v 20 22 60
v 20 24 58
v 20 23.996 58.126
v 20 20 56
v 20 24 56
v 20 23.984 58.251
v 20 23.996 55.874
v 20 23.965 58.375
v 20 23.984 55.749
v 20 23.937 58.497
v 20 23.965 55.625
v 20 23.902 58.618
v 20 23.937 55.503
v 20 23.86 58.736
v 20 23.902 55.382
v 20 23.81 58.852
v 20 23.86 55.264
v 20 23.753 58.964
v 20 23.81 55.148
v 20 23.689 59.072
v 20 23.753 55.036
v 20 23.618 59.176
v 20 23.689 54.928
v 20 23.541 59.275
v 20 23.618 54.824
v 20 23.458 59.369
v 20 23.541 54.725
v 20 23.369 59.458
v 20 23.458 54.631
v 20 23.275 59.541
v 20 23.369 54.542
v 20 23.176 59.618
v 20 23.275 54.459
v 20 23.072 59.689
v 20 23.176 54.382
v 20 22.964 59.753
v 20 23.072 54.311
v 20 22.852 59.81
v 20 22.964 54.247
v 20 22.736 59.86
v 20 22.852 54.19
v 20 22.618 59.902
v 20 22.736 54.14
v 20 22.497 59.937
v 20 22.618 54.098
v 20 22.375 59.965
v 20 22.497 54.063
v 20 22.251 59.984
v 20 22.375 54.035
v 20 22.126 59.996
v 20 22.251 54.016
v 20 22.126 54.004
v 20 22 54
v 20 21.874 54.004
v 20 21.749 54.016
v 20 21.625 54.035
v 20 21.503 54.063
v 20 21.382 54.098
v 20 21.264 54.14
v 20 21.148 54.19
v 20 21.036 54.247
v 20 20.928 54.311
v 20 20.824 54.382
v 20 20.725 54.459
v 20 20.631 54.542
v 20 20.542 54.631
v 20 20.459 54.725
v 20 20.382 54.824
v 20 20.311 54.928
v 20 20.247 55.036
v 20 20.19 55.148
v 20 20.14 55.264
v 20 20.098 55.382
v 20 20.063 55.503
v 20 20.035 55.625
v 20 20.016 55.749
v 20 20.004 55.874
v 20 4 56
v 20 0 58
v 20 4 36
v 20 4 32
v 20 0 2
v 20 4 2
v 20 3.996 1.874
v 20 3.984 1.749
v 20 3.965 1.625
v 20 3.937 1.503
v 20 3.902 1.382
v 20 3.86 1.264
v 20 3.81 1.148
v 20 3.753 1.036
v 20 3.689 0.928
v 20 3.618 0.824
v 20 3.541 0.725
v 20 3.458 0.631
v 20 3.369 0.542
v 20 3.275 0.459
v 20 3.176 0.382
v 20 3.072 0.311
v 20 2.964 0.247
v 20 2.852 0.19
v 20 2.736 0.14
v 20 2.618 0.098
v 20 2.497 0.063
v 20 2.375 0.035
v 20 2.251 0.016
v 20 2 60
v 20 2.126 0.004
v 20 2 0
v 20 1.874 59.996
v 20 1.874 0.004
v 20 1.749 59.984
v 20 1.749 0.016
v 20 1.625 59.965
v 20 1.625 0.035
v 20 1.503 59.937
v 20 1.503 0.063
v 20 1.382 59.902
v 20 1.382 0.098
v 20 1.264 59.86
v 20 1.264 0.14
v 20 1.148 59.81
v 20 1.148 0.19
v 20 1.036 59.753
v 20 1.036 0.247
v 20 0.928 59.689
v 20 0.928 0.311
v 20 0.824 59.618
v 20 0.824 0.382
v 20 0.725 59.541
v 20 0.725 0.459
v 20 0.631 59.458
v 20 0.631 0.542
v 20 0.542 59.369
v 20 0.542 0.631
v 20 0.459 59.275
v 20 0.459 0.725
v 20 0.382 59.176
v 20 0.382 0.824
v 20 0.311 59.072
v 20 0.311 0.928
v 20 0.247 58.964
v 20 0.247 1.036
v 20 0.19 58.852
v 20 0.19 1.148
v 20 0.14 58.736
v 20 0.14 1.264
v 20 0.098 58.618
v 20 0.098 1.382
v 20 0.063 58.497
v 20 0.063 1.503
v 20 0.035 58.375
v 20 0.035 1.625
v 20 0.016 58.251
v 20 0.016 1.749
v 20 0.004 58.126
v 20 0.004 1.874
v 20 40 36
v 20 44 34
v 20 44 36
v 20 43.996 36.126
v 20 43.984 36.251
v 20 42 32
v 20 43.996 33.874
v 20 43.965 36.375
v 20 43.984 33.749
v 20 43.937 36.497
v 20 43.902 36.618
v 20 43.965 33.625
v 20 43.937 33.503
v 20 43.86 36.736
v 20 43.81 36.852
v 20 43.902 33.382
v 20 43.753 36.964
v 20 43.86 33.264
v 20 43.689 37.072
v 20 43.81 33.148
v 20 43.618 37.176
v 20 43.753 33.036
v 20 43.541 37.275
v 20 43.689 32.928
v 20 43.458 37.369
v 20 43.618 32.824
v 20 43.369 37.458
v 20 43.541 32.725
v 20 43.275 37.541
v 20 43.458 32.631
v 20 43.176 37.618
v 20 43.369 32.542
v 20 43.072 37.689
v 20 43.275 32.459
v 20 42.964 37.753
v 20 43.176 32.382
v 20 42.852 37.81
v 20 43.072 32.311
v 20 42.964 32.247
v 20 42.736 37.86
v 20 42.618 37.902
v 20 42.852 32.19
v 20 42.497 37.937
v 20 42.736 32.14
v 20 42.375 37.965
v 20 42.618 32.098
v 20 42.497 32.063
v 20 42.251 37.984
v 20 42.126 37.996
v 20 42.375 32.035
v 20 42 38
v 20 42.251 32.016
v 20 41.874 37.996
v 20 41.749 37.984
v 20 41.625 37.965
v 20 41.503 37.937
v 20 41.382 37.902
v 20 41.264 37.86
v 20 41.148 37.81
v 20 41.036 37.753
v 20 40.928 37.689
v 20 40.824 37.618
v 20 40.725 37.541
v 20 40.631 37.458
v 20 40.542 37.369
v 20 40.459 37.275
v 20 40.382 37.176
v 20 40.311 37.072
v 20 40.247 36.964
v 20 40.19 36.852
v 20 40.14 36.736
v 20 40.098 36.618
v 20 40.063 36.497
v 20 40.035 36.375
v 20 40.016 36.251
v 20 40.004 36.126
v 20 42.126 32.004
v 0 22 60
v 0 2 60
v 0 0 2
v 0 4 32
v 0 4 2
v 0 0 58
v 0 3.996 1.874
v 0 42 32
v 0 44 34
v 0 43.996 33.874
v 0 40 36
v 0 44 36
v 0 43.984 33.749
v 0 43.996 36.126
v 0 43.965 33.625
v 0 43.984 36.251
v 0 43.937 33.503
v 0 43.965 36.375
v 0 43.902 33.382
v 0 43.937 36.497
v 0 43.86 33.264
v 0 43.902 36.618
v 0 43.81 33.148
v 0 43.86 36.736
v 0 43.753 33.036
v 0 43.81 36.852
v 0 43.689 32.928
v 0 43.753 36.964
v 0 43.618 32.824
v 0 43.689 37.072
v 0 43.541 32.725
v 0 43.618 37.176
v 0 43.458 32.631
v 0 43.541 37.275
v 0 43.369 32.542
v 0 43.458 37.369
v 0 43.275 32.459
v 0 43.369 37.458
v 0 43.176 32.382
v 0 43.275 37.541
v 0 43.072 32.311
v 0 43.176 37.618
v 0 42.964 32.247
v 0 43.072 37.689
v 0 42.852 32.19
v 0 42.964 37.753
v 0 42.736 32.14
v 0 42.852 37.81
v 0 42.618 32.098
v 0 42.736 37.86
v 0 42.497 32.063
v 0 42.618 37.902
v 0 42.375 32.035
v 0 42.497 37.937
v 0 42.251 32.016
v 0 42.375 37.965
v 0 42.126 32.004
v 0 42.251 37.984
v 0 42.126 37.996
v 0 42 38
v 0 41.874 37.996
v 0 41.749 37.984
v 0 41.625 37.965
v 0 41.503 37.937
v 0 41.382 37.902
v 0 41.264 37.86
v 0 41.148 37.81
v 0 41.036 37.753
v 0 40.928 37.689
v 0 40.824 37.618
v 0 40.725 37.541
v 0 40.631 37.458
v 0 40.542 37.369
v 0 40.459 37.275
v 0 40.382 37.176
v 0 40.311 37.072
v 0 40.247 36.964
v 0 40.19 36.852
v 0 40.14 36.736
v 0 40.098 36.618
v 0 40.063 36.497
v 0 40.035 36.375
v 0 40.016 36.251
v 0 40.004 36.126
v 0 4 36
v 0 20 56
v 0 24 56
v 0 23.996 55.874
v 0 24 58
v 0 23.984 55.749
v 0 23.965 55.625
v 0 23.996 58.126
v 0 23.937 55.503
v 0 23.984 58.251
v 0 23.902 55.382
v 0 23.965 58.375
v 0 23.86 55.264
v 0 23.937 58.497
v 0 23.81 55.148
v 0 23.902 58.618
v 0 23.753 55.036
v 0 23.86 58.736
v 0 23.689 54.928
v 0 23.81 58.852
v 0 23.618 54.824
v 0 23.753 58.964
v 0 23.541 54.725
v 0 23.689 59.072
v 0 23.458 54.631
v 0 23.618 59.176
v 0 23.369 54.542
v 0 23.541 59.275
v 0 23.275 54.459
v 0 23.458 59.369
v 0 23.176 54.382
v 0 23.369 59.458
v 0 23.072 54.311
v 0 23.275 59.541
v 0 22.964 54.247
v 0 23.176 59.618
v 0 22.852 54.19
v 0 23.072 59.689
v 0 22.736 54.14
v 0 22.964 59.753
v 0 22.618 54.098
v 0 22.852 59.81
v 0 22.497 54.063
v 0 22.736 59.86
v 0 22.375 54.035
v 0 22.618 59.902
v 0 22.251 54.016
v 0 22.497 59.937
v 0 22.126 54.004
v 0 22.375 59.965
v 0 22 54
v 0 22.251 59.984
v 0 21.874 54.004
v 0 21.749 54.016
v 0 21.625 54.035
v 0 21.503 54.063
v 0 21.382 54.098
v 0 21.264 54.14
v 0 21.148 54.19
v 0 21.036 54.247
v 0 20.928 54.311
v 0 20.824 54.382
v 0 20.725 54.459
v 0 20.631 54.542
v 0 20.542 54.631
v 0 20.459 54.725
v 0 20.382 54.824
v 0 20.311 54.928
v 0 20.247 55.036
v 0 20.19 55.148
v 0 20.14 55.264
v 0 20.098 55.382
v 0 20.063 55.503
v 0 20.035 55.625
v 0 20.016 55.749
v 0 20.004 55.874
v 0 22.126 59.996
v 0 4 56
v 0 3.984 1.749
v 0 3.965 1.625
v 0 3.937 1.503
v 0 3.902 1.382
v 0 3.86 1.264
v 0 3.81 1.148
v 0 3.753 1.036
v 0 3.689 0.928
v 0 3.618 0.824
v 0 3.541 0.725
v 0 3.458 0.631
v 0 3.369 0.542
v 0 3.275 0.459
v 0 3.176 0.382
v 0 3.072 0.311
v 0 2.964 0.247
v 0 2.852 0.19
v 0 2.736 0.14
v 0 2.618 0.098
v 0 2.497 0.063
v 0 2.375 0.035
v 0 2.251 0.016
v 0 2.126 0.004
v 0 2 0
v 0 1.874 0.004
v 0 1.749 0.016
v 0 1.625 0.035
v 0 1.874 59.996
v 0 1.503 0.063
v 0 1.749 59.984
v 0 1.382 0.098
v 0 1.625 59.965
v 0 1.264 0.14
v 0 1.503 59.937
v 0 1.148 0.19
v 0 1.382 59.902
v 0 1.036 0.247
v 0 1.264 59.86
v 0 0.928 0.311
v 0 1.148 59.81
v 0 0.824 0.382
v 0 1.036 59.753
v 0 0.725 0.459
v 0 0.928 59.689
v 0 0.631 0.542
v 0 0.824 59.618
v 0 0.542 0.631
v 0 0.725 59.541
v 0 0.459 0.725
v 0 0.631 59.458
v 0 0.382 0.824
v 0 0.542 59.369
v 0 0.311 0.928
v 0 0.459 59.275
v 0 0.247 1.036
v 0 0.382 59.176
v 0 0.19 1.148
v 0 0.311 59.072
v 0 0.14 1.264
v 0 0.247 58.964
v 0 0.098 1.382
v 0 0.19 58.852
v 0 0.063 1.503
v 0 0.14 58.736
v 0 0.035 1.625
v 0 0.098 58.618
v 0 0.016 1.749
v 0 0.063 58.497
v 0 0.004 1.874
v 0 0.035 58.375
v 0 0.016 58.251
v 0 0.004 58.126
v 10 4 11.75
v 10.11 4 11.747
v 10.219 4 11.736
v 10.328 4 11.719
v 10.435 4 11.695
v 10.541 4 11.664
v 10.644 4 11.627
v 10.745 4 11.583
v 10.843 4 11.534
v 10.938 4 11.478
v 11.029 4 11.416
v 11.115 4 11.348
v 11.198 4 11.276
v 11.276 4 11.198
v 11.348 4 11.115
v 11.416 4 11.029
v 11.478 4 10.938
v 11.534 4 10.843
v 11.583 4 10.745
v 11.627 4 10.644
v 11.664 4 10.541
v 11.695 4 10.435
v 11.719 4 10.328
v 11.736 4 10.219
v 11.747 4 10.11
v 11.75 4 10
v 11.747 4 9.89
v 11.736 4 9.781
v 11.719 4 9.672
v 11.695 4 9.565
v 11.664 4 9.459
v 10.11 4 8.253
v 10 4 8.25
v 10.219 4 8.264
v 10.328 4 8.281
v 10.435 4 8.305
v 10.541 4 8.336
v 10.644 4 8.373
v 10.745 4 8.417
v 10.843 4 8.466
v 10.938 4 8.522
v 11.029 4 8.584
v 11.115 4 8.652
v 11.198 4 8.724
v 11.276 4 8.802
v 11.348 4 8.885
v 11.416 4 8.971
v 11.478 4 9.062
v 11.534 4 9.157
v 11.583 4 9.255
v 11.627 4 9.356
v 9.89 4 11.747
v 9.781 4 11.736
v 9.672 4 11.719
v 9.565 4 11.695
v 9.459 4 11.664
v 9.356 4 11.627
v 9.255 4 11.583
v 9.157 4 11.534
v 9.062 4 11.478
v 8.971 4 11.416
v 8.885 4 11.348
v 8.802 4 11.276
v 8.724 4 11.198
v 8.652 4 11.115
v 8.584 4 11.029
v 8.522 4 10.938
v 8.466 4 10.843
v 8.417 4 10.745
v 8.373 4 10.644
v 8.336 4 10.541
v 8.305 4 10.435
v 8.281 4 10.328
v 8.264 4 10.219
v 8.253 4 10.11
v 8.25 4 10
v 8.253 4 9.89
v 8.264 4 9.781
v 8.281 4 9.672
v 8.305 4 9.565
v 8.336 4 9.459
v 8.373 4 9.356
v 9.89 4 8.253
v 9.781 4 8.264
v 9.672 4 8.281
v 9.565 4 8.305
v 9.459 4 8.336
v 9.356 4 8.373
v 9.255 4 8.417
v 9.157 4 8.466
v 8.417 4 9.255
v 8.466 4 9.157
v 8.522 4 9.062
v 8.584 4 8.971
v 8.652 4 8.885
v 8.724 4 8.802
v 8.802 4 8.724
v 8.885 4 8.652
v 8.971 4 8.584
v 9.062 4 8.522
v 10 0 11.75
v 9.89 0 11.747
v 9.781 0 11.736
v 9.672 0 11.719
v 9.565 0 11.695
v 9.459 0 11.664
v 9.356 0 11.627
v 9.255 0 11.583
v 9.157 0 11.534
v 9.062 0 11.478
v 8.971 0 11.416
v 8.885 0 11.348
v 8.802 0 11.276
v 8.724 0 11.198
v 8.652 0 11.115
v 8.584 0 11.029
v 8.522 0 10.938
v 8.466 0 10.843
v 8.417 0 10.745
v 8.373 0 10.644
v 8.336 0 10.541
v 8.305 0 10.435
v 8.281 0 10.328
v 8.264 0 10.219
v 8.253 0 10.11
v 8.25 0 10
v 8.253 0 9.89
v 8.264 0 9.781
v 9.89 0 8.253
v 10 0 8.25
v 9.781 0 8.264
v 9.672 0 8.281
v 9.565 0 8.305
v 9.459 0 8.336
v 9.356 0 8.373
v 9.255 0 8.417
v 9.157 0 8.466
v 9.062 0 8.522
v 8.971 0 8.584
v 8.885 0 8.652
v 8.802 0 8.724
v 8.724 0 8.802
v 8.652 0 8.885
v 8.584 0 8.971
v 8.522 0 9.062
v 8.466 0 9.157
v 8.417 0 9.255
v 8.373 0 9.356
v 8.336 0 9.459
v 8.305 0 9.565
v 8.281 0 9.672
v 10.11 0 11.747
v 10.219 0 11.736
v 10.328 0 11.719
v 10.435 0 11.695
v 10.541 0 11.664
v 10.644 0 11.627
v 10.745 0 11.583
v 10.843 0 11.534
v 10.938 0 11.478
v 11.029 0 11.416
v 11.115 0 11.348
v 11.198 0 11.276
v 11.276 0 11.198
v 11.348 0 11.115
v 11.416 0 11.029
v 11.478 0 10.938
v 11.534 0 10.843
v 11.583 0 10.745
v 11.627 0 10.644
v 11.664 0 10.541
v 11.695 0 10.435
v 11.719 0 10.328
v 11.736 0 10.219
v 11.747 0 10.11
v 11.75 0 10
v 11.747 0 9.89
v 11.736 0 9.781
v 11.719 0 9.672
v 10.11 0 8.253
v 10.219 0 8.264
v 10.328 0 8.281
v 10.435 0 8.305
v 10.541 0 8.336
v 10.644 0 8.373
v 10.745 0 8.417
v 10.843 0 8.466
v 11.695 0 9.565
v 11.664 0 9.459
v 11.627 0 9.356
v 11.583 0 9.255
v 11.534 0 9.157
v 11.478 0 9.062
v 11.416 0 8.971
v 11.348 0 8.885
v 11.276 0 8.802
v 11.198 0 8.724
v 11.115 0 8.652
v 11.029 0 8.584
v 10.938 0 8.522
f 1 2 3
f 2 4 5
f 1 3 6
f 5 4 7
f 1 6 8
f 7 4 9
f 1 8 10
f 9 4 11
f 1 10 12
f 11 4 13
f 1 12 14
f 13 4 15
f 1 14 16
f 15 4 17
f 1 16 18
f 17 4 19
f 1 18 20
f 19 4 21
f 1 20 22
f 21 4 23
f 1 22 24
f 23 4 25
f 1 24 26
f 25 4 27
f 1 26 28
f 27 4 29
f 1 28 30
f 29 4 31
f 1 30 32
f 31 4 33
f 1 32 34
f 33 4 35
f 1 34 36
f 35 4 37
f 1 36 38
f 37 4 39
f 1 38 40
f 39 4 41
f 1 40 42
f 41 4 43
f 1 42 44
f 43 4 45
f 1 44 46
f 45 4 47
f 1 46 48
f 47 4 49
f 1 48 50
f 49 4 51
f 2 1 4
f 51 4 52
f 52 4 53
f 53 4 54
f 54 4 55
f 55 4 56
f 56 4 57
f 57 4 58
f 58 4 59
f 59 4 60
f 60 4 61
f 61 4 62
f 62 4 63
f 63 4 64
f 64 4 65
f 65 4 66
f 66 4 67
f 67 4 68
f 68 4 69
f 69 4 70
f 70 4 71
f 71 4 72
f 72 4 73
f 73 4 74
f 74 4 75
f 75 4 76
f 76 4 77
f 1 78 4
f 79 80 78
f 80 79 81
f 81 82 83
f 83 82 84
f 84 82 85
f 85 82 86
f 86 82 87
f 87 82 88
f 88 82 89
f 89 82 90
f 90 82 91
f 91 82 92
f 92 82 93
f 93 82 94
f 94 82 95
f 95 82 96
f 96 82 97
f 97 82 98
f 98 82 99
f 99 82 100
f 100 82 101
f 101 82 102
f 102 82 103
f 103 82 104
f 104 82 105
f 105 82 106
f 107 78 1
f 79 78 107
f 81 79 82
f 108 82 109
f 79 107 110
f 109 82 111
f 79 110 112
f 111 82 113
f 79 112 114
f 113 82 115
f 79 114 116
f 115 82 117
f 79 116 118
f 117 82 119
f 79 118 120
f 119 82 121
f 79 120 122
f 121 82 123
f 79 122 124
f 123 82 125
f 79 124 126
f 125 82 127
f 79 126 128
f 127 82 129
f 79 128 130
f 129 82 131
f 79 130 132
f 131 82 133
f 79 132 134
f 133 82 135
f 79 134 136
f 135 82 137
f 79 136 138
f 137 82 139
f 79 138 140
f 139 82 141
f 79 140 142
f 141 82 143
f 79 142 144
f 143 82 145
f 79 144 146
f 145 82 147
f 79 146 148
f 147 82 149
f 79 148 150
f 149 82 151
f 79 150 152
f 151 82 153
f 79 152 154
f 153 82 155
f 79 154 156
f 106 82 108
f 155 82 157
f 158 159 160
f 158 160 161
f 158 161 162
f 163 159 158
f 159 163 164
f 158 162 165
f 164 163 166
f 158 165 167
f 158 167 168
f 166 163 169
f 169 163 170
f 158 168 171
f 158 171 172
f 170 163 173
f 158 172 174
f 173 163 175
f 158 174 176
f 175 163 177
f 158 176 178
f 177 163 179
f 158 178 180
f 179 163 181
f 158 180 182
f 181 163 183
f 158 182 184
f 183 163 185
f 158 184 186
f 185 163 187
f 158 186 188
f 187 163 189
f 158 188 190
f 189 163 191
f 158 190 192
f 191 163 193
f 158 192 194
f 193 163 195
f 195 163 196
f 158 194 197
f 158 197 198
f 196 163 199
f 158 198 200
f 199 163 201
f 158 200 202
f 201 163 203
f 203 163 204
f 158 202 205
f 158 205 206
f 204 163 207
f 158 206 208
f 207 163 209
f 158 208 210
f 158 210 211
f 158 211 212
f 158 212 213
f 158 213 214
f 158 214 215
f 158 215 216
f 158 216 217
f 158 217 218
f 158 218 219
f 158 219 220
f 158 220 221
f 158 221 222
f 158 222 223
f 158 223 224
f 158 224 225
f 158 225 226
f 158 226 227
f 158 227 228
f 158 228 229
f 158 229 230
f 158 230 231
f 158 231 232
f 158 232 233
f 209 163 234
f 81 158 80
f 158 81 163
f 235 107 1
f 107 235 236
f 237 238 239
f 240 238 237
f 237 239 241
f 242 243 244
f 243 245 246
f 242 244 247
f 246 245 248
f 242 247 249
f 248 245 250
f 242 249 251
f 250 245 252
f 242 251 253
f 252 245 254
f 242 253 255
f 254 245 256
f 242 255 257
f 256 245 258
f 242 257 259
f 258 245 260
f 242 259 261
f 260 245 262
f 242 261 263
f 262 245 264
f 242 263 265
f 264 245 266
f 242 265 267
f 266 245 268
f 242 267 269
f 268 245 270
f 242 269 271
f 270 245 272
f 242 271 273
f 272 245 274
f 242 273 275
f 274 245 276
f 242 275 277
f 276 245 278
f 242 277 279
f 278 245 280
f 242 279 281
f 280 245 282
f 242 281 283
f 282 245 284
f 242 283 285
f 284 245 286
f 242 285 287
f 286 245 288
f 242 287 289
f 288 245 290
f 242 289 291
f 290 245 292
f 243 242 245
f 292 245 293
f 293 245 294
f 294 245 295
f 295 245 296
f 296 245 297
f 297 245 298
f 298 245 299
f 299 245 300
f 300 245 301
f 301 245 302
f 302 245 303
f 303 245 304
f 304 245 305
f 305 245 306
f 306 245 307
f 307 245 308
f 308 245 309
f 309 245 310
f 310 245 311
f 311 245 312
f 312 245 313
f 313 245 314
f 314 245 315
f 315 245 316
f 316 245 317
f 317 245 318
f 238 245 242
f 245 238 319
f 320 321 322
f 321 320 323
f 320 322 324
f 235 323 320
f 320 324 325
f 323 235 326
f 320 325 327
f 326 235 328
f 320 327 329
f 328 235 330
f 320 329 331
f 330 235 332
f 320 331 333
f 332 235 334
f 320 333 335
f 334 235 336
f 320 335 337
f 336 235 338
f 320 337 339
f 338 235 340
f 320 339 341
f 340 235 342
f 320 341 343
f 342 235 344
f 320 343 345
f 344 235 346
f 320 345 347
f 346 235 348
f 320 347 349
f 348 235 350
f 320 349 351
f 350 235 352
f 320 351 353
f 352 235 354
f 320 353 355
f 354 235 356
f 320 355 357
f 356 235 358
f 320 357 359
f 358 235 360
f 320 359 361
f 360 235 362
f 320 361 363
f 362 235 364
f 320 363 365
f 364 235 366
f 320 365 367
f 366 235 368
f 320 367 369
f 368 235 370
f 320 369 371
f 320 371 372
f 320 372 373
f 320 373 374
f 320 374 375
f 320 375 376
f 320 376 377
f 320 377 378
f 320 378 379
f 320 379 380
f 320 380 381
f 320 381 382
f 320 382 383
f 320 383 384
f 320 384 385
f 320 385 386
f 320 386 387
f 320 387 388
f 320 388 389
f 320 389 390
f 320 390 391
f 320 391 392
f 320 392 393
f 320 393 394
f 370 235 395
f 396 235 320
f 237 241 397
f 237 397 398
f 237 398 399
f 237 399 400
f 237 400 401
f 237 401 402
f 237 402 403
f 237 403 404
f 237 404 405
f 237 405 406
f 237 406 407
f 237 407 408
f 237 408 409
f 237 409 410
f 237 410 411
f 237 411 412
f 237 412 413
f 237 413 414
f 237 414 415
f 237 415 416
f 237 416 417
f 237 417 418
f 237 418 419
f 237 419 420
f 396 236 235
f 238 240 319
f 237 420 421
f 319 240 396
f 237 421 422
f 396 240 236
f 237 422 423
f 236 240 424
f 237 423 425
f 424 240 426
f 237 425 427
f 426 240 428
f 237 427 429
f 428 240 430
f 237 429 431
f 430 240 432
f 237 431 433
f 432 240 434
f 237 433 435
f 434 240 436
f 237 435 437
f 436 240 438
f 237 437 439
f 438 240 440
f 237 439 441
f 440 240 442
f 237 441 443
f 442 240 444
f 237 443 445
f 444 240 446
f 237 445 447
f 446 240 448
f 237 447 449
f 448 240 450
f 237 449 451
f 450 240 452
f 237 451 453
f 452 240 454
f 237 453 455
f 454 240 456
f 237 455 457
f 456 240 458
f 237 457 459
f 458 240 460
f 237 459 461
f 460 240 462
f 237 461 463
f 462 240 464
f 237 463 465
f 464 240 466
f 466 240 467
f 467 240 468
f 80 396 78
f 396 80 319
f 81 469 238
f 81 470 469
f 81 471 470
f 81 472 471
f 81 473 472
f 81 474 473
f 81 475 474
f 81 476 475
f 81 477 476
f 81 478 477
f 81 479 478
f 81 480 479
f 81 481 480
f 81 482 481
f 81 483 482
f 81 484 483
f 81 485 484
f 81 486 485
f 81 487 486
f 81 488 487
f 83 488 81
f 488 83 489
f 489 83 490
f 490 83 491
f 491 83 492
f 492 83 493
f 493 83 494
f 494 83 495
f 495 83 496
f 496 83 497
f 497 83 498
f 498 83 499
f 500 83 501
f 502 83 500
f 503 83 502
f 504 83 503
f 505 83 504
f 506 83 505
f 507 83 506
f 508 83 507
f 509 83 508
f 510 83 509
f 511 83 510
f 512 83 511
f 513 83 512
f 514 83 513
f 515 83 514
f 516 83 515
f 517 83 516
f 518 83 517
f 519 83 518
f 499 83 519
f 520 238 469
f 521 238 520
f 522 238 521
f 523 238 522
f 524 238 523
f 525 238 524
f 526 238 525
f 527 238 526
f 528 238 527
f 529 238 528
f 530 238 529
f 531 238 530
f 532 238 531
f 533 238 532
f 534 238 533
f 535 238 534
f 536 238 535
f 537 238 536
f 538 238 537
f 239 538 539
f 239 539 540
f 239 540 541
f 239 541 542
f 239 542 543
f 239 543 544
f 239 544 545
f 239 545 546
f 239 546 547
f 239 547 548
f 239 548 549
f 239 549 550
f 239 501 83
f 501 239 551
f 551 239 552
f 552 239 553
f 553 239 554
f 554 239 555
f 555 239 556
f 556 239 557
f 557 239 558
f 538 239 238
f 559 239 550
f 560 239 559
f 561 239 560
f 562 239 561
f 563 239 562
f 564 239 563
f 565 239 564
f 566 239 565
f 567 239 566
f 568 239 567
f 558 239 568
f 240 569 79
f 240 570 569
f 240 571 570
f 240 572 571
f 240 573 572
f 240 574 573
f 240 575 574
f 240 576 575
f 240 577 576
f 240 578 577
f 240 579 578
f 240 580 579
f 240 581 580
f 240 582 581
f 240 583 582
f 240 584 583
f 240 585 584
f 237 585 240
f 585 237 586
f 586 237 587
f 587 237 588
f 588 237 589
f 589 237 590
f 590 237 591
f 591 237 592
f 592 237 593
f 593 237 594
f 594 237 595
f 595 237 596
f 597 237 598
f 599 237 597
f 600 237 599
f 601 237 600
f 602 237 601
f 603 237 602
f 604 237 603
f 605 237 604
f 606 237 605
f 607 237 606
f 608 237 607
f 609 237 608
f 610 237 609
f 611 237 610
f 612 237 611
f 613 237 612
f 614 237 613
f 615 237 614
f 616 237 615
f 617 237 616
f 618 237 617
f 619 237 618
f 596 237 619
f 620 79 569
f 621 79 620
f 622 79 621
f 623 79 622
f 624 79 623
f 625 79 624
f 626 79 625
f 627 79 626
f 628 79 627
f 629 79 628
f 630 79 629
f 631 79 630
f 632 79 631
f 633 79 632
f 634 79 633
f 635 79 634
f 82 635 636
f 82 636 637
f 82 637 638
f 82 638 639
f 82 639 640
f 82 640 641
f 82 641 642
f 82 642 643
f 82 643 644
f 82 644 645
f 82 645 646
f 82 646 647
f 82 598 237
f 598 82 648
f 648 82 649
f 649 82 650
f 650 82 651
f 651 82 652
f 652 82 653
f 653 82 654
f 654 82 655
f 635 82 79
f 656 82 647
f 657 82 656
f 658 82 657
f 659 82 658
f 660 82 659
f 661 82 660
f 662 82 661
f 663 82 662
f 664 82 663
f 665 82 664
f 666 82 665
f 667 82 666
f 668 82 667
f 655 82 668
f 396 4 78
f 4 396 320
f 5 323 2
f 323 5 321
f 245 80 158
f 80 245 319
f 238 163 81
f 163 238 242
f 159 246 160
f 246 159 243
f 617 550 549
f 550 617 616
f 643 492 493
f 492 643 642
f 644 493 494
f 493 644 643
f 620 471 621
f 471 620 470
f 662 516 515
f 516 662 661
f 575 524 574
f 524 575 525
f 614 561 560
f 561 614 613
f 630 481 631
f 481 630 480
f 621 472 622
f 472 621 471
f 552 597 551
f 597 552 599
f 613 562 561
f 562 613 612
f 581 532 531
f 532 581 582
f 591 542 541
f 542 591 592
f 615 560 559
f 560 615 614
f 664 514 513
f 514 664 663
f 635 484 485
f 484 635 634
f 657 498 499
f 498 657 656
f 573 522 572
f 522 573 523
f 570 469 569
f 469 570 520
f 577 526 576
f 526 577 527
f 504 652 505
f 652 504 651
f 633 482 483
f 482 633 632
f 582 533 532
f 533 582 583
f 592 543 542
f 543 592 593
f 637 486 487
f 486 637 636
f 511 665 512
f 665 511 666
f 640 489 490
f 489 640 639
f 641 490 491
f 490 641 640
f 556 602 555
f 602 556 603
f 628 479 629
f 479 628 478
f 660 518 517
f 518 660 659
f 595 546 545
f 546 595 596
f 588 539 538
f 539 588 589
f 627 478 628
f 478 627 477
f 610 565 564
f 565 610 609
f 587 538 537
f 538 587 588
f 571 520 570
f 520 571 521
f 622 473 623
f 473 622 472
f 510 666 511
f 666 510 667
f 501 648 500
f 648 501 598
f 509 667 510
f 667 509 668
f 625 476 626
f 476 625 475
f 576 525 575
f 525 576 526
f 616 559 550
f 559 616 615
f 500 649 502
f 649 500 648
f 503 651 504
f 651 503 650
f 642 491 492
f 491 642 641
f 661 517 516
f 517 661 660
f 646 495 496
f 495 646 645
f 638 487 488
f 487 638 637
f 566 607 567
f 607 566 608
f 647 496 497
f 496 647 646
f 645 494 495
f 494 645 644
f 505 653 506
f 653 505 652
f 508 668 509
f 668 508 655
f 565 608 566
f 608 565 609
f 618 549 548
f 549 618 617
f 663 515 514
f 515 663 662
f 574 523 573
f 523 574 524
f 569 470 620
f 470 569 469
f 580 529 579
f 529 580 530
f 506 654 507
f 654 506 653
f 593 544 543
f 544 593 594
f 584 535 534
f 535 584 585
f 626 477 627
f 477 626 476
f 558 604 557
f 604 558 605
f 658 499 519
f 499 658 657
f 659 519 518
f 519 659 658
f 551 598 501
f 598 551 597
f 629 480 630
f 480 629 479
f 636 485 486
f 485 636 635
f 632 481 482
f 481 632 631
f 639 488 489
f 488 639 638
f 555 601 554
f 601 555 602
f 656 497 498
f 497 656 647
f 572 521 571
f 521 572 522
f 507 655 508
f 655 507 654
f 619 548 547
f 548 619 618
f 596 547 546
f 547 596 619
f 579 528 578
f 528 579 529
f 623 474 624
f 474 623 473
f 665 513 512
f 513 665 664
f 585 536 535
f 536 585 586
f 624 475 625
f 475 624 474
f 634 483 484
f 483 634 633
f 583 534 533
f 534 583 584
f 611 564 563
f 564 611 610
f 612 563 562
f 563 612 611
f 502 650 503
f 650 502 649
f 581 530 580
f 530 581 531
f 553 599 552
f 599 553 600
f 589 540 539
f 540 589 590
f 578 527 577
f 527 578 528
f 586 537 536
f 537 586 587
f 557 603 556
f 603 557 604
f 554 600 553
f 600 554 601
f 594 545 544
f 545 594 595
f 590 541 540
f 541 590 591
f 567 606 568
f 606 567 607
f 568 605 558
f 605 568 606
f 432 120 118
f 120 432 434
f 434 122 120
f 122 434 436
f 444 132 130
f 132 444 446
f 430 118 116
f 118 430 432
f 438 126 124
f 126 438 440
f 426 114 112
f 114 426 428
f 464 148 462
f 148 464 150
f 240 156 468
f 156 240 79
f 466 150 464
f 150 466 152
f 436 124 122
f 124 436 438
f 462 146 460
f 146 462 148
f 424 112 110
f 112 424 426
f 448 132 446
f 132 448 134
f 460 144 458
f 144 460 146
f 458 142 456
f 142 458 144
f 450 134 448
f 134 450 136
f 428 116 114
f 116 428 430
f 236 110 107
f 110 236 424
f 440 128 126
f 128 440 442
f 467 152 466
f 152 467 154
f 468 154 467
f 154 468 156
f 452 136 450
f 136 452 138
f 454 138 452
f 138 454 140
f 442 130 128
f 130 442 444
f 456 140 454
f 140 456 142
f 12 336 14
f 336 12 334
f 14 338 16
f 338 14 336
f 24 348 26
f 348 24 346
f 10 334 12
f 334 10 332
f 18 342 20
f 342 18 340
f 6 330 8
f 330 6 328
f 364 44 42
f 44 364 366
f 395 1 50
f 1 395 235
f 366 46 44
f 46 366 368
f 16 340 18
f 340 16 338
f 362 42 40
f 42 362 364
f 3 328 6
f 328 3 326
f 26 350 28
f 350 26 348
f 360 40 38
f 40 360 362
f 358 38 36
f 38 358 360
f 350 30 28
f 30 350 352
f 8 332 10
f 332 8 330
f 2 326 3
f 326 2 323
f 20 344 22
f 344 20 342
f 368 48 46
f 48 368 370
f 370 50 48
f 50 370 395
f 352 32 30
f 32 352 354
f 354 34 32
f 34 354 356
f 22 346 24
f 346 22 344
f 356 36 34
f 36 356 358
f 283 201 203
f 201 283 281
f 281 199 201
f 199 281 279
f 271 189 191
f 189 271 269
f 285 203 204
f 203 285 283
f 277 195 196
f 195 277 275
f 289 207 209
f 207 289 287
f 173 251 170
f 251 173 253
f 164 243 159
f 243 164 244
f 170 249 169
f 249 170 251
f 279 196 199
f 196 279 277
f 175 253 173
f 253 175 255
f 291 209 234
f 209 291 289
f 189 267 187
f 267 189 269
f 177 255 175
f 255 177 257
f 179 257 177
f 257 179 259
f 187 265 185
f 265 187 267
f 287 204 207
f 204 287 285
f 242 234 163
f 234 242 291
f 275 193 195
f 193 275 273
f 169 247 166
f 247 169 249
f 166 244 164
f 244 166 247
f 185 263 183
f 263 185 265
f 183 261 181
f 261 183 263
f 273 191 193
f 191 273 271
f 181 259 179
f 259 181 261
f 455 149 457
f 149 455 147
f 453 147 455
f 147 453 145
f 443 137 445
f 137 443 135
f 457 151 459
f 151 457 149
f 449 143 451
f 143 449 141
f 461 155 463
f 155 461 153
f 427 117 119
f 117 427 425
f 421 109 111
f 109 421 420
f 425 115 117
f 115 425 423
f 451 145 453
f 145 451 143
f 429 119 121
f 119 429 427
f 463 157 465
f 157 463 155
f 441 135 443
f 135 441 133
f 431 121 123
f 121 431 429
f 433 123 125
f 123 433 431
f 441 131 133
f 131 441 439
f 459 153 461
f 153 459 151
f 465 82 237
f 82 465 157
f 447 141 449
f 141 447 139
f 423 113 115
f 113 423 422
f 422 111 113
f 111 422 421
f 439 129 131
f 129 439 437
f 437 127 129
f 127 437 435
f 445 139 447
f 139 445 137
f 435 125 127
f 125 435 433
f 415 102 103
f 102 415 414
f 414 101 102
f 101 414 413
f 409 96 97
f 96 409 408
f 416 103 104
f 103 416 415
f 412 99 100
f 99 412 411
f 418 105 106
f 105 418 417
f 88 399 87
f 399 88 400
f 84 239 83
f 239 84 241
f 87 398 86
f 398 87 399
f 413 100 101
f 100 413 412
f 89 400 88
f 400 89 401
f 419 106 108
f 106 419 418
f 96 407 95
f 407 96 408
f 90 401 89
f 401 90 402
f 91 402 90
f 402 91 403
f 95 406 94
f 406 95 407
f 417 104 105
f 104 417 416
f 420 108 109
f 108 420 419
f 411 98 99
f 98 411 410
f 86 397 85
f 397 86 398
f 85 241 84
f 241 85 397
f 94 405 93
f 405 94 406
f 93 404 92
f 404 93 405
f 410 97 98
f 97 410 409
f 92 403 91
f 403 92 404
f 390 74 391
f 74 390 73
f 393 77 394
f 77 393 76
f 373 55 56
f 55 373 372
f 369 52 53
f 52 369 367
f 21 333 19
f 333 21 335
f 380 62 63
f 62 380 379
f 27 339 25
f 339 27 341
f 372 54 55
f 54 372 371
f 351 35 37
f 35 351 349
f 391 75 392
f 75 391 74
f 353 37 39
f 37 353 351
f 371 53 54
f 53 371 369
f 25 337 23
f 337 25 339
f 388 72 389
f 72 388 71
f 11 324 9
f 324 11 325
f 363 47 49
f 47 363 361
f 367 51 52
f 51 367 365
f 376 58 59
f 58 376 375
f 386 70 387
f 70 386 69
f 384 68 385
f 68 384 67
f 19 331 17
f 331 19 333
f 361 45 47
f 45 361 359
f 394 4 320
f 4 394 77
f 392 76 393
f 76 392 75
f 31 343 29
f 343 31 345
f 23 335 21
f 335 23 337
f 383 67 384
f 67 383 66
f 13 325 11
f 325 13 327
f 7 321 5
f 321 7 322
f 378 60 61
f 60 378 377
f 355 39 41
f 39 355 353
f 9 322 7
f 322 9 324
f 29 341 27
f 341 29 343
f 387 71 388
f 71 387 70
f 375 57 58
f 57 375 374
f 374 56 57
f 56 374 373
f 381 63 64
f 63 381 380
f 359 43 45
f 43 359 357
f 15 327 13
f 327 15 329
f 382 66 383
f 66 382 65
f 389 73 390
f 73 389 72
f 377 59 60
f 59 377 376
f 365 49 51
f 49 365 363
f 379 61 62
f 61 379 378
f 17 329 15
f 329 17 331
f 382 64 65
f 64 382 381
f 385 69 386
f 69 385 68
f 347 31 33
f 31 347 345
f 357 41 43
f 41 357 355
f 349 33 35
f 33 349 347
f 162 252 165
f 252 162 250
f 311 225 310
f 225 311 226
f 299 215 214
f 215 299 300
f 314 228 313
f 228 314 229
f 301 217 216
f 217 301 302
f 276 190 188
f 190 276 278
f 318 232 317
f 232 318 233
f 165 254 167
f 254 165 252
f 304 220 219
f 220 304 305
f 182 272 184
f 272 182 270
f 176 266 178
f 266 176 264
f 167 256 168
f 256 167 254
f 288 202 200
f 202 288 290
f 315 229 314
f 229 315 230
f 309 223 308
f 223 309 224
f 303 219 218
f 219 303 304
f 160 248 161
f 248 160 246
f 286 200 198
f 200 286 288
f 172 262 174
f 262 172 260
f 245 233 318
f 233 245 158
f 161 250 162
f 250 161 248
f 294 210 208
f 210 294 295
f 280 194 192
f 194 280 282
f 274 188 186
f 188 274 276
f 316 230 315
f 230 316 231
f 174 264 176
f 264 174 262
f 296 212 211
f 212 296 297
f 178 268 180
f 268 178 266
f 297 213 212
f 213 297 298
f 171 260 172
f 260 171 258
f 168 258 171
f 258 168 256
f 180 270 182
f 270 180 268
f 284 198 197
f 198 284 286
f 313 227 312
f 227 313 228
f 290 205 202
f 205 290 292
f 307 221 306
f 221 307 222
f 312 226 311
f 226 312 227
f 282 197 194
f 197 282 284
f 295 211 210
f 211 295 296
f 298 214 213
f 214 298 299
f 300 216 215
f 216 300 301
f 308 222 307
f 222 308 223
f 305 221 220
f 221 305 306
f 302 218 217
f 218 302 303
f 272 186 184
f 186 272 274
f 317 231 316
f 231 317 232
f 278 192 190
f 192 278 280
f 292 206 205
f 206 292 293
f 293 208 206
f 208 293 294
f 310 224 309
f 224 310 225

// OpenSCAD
// Measures
thick = 4; // Thickness
t_w = 20; // Width
t_h = 60; // Height
u_arm_l = 20; // Upper arm lenght
d_arm_l = 40; // Lower arm lenght
ua_l = u_arm_l+thick;
da_l = d_arm_l+thick;
d_arm_sep = 20; // How far do you want lower tab be from the upper tab
chamfer_size = thick/2;


// Parts definitions
m_part = [t_w,thick,t_h]; // Define the main part
u_arm = [t_w,ua_l,thick]; // Define the upper arm
d_arm = [t_w,da_l,thick]; // Define the lower arm


// Positioning the parts on assembly
m_part_loc = [0,0,0];
ua_loc = t_h-thick;
u_arm_loc = [0,0,ua_loc];
da_loc = (t_h-(thick*2))-d_arm_sep;
d_arm_loc = [0,0,da_loc];


// Parts building
module main_plate()
    {
        translate(m_part_loc) cube(m_part);
        translate(u_arm_loc) cube(u_arm);
        translate(d_arm_loc) cube(d_arm);
    }
    
module main_hole_drilled()
    {
        difference()
            {
                main_plate();
                filament_hole();
            }
    }
    
module main_hole_rounded()
    {
        union()
            {
                main_hole_drilled();
                translate([t_w/2,2.5,t_w/2]) scale(.25
) rotate([90,90,0])round_hole();
            }
    }
    
// Assembly position
*main_hole_drilled();
assembly();

// Drilling hole for the filament
hole_loc = [t_w/2,12,t_w/2];
r_hole_loc_1 = [t_w/2,0,t_w/2];
r_hole_loc_2 = [t_w/2,4,t_w/2];
fil_dia = 1.75; // Diameter of filament
module filament_hole()
    {
        translate(hole_loc) rotate([90,0,0]) cylinder(h = 20, r = fil_dia, $fn = 100);
    }

module round_hole()
    {
rotate_extrude(convexity = .5, $fn = 100)
translate([10,10,10])
circle(r = 3, $fn = 100);
    }

// Rounding corners
module chamfer_template()
    {
        difference()
            {
                translate([-2,-1,0])cube([t_w+4,chamfer_size+1,chamfer_size+1]);
                translate([-4,chamfer_size,0]) rotate([0,90,0]) cylinder(h = t_w+8,r = chamfer_size, $fn = 100);
            }
    }
    
module assembly()
    {
        difference()
            {
                main_hole_drilled();
                // Upper arm chamfers
                translate([0,0,ua_loc+chamfer_size]) chamfer_template();
                translate([0,u_arm_l+chamfer_size,ua_loc+(chamfer_size*2)]) rotate([-90,0,0]) chamfer_template();
                *translate([0,u_arm_l+(chamfer_size*2),ua_loc+chamfer_size]) rotate([180,0,0]) chamfer_template();
                // Lower arm chamfers
                *translate([0,d_arm_l+chamfer_size,da_loc+(chamfer_size*2)]) rotate([-90,0,0]) chamfer_template();
                translate([0,d_arm_l+(chamfer_size*2),da_loc+chamfer_size]) rotate([180,0,0]) chamfer_template();
                // Base chamfers
                translate([0,chamfer_size,0]) rotate([90,0,0]) chamfer_template();
                translate([0,thick,chamfer_size]) rotate([180,0,0]) chamfer_template();
            }
        union()
            {
                translate([0,u_arm_l+(thick/2),ua_loc]) rotate([0,90,0]) cylinder(h = t_w, r = chamfer_size, $fn = 100);
                                translate([0,d_arm_l+(thick/2),da_loc+thick]) rotate([0,90,0]) cylinder(h = t_w, r = chamfer_size, $fn = 100);
            }
    }
